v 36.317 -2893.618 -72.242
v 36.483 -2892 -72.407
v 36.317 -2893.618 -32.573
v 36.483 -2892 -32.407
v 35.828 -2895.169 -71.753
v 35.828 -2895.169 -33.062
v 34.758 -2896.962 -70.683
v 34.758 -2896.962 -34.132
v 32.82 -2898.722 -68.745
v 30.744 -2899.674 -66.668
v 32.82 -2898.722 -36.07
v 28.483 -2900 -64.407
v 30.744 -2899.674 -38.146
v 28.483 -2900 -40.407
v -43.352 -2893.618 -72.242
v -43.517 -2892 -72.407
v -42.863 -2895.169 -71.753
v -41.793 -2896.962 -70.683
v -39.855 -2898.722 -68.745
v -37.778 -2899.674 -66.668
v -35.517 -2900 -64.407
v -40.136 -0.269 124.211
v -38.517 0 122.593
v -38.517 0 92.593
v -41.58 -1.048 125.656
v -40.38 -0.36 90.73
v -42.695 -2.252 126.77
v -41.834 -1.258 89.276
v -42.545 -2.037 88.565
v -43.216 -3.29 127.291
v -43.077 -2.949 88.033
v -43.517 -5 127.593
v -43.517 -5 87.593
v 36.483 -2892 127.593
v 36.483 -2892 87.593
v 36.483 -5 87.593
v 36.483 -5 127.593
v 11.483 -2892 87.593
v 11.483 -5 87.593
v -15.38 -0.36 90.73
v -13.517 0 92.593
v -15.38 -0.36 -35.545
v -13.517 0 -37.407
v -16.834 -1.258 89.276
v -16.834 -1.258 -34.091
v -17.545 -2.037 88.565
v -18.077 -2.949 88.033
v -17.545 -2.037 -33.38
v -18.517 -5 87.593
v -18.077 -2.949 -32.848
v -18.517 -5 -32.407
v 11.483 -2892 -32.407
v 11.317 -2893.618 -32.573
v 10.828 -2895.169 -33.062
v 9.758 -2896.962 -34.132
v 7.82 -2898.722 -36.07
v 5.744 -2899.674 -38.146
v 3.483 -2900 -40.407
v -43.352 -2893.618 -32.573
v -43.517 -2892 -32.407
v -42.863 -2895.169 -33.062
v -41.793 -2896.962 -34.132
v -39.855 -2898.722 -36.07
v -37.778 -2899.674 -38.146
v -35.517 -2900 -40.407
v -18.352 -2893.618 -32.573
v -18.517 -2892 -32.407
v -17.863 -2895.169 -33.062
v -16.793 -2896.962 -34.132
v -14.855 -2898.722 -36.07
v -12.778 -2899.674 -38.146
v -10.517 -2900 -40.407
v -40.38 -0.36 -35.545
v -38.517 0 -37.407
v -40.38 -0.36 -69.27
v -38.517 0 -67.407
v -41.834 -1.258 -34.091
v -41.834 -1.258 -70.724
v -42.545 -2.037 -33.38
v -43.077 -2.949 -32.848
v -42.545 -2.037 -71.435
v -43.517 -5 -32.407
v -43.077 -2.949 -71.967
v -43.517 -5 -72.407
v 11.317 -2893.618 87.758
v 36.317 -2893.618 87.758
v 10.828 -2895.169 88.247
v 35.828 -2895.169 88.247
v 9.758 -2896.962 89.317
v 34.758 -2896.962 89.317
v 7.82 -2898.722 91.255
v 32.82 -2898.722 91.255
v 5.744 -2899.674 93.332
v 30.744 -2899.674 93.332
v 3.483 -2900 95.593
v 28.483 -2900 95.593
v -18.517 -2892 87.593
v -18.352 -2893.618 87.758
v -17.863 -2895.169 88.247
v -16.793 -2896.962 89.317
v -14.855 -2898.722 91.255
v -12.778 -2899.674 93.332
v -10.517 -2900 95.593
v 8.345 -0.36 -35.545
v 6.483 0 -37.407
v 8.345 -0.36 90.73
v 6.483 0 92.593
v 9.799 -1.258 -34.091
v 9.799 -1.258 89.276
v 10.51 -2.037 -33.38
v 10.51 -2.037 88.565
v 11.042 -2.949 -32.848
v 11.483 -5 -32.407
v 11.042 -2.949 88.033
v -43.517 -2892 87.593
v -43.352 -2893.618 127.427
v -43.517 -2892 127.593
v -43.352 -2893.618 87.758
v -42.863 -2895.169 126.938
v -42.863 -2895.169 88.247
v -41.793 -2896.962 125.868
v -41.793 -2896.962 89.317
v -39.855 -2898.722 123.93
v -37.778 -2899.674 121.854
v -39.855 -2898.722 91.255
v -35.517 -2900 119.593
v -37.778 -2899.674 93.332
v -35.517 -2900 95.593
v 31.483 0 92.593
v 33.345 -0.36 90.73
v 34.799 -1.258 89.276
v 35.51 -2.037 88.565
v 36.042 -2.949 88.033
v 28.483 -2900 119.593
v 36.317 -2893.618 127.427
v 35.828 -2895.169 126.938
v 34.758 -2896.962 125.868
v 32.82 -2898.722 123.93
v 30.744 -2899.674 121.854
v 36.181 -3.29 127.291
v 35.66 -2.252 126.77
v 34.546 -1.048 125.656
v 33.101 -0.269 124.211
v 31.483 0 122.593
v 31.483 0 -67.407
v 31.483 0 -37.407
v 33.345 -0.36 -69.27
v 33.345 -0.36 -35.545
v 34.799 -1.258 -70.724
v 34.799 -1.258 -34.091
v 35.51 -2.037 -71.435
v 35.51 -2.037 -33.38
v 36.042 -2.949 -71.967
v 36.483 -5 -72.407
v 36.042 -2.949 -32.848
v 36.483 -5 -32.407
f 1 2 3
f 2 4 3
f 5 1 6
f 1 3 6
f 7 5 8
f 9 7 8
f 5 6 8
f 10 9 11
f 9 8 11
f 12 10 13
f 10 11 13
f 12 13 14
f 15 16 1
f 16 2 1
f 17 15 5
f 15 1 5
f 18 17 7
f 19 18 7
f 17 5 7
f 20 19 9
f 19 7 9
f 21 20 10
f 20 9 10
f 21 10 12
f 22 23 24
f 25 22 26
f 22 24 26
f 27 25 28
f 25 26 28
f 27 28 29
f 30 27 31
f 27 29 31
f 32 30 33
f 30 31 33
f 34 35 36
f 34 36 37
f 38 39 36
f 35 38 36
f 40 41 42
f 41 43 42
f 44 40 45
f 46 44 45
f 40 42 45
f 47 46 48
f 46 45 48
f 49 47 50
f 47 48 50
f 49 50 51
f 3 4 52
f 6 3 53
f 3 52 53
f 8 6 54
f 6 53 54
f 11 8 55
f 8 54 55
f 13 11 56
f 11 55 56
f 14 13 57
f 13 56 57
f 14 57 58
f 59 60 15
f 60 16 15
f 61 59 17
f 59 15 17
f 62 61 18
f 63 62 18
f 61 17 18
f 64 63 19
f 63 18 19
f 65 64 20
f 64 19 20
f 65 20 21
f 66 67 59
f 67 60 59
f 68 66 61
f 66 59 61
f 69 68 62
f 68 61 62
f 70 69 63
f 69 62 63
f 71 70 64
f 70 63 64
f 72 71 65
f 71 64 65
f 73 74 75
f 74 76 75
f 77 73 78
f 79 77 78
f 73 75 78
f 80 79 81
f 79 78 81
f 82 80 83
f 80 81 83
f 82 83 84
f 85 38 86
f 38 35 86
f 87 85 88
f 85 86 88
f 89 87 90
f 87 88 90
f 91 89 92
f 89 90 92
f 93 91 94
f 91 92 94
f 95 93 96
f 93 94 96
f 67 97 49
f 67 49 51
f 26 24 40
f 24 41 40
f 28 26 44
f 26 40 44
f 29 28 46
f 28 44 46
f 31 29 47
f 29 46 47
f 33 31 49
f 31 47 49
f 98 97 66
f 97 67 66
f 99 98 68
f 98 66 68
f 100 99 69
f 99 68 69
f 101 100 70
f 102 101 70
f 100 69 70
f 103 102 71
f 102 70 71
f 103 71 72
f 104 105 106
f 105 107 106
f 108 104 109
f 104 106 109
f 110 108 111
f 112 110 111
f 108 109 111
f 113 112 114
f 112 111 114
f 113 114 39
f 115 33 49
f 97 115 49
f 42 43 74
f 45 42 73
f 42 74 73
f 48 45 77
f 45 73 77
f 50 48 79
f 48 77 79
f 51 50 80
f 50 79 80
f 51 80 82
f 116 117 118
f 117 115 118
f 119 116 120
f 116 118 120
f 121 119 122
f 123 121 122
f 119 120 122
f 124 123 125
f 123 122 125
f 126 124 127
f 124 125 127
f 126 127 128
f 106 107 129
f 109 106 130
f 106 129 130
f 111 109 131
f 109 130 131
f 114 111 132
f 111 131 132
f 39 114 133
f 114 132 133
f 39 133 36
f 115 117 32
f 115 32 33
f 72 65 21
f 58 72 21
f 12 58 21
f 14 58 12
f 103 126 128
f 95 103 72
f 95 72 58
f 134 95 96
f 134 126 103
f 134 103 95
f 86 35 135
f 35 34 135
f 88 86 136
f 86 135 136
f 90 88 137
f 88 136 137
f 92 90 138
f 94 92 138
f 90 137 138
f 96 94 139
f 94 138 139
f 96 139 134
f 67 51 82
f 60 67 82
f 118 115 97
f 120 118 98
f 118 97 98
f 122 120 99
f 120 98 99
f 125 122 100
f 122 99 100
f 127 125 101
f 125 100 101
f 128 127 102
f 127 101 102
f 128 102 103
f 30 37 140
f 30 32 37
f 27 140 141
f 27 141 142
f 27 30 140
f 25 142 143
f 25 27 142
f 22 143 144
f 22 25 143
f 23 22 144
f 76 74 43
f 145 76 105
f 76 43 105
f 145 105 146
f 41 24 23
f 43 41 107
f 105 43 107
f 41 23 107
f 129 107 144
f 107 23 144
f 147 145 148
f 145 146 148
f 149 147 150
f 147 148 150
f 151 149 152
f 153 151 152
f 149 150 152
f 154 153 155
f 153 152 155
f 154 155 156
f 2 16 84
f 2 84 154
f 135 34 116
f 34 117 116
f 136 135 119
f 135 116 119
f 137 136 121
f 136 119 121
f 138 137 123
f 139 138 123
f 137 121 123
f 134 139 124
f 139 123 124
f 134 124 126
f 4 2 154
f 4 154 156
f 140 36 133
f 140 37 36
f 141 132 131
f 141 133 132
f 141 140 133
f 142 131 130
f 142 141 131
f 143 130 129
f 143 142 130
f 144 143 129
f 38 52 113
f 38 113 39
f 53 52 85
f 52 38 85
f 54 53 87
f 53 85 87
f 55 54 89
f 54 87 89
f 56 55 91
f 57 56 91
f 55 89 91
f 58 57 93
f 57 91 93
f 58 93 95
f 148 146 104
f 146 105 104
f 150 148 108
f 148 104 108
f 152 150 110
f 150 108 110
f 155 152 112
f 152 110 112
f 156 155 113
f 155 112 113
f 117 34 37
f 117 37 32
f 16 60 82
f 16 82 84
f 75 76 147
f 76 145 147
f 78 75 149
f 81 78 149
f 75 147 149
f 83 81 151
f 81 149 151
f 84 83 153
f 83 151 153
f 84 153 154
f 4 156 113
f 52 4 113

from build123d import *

# Parameters (mm, degrees)
F1_DEPTH = 2900
F2_R     = 8
F3_R     = 5


with BuildPart() as f1:
    # F0 (on Front) → F1 (new body)
    with BuildSketch(Plane.XZ):
        Polygon((36.482626, 127.592679), (-43.517374, 127.592679), (-43.517374, 87.592679), (-18.517374, 87.592679), (-18.517374, -32.407321), (-43.517374, -32.407321), (-43.517374, -72.407321), (36.482626, -72.407321), (36.482626, -32.407321), (11.482626, -32.407321), (11.482626, 87.592679), (36.482626, 87.592679), align=None)
    extrude(amount=F1_DEPTH)

    # F2
    f2_edges = [f1.edges().sort_by_distance(p)[0] for p in [
        (-3.517374, -2900, 127.592679),
        (-43.517374, -2900, 107.592679),
        (-31.017374, -2900, 87.592679),
        (-18.517374, -2900, 27.592679),
        (-31.017374, -2900, -32.407321),
        (-43.517374, -2900, -52.407321),
        (-3.517374, -2900, -72.407321),
        (36.482626, -2900, -52.407321),
        (23.982626, -2900, -32.407321),
        (11.482626, -2900, 27.592679),
        (23.982626, -2900, 87.592679),
        (36.482626, -2900, 107.592679),
    ]]
    fillet(f2_edges, radius=F2_R)

    # F3
    f3_edges = [f1.edges().sort_by_distance(p)[0] for p in [
        (-3.517374, 0, 127.592679),
        (-43.517374, 0, 107.592679),
        (-31.017374, 0, 87.592679),
        (-18.517374, 0, 27.592679),
        (-31.017374, 0, -32.407321),
        (-43.517374, 0, -52.407321),
        (-3.517374, 0, -72.407321),
        (36.482626, 0, -52.407321),
        (23.982626, 0, -32.407321),
        (11.482626, 0, 27.592679),
        (23.982626, 0, 87.592679),
        (36.482626, 0, 107.592679),
    ]]
    fillet(f3_edges, radius=F3_R)


solid = f1.part
